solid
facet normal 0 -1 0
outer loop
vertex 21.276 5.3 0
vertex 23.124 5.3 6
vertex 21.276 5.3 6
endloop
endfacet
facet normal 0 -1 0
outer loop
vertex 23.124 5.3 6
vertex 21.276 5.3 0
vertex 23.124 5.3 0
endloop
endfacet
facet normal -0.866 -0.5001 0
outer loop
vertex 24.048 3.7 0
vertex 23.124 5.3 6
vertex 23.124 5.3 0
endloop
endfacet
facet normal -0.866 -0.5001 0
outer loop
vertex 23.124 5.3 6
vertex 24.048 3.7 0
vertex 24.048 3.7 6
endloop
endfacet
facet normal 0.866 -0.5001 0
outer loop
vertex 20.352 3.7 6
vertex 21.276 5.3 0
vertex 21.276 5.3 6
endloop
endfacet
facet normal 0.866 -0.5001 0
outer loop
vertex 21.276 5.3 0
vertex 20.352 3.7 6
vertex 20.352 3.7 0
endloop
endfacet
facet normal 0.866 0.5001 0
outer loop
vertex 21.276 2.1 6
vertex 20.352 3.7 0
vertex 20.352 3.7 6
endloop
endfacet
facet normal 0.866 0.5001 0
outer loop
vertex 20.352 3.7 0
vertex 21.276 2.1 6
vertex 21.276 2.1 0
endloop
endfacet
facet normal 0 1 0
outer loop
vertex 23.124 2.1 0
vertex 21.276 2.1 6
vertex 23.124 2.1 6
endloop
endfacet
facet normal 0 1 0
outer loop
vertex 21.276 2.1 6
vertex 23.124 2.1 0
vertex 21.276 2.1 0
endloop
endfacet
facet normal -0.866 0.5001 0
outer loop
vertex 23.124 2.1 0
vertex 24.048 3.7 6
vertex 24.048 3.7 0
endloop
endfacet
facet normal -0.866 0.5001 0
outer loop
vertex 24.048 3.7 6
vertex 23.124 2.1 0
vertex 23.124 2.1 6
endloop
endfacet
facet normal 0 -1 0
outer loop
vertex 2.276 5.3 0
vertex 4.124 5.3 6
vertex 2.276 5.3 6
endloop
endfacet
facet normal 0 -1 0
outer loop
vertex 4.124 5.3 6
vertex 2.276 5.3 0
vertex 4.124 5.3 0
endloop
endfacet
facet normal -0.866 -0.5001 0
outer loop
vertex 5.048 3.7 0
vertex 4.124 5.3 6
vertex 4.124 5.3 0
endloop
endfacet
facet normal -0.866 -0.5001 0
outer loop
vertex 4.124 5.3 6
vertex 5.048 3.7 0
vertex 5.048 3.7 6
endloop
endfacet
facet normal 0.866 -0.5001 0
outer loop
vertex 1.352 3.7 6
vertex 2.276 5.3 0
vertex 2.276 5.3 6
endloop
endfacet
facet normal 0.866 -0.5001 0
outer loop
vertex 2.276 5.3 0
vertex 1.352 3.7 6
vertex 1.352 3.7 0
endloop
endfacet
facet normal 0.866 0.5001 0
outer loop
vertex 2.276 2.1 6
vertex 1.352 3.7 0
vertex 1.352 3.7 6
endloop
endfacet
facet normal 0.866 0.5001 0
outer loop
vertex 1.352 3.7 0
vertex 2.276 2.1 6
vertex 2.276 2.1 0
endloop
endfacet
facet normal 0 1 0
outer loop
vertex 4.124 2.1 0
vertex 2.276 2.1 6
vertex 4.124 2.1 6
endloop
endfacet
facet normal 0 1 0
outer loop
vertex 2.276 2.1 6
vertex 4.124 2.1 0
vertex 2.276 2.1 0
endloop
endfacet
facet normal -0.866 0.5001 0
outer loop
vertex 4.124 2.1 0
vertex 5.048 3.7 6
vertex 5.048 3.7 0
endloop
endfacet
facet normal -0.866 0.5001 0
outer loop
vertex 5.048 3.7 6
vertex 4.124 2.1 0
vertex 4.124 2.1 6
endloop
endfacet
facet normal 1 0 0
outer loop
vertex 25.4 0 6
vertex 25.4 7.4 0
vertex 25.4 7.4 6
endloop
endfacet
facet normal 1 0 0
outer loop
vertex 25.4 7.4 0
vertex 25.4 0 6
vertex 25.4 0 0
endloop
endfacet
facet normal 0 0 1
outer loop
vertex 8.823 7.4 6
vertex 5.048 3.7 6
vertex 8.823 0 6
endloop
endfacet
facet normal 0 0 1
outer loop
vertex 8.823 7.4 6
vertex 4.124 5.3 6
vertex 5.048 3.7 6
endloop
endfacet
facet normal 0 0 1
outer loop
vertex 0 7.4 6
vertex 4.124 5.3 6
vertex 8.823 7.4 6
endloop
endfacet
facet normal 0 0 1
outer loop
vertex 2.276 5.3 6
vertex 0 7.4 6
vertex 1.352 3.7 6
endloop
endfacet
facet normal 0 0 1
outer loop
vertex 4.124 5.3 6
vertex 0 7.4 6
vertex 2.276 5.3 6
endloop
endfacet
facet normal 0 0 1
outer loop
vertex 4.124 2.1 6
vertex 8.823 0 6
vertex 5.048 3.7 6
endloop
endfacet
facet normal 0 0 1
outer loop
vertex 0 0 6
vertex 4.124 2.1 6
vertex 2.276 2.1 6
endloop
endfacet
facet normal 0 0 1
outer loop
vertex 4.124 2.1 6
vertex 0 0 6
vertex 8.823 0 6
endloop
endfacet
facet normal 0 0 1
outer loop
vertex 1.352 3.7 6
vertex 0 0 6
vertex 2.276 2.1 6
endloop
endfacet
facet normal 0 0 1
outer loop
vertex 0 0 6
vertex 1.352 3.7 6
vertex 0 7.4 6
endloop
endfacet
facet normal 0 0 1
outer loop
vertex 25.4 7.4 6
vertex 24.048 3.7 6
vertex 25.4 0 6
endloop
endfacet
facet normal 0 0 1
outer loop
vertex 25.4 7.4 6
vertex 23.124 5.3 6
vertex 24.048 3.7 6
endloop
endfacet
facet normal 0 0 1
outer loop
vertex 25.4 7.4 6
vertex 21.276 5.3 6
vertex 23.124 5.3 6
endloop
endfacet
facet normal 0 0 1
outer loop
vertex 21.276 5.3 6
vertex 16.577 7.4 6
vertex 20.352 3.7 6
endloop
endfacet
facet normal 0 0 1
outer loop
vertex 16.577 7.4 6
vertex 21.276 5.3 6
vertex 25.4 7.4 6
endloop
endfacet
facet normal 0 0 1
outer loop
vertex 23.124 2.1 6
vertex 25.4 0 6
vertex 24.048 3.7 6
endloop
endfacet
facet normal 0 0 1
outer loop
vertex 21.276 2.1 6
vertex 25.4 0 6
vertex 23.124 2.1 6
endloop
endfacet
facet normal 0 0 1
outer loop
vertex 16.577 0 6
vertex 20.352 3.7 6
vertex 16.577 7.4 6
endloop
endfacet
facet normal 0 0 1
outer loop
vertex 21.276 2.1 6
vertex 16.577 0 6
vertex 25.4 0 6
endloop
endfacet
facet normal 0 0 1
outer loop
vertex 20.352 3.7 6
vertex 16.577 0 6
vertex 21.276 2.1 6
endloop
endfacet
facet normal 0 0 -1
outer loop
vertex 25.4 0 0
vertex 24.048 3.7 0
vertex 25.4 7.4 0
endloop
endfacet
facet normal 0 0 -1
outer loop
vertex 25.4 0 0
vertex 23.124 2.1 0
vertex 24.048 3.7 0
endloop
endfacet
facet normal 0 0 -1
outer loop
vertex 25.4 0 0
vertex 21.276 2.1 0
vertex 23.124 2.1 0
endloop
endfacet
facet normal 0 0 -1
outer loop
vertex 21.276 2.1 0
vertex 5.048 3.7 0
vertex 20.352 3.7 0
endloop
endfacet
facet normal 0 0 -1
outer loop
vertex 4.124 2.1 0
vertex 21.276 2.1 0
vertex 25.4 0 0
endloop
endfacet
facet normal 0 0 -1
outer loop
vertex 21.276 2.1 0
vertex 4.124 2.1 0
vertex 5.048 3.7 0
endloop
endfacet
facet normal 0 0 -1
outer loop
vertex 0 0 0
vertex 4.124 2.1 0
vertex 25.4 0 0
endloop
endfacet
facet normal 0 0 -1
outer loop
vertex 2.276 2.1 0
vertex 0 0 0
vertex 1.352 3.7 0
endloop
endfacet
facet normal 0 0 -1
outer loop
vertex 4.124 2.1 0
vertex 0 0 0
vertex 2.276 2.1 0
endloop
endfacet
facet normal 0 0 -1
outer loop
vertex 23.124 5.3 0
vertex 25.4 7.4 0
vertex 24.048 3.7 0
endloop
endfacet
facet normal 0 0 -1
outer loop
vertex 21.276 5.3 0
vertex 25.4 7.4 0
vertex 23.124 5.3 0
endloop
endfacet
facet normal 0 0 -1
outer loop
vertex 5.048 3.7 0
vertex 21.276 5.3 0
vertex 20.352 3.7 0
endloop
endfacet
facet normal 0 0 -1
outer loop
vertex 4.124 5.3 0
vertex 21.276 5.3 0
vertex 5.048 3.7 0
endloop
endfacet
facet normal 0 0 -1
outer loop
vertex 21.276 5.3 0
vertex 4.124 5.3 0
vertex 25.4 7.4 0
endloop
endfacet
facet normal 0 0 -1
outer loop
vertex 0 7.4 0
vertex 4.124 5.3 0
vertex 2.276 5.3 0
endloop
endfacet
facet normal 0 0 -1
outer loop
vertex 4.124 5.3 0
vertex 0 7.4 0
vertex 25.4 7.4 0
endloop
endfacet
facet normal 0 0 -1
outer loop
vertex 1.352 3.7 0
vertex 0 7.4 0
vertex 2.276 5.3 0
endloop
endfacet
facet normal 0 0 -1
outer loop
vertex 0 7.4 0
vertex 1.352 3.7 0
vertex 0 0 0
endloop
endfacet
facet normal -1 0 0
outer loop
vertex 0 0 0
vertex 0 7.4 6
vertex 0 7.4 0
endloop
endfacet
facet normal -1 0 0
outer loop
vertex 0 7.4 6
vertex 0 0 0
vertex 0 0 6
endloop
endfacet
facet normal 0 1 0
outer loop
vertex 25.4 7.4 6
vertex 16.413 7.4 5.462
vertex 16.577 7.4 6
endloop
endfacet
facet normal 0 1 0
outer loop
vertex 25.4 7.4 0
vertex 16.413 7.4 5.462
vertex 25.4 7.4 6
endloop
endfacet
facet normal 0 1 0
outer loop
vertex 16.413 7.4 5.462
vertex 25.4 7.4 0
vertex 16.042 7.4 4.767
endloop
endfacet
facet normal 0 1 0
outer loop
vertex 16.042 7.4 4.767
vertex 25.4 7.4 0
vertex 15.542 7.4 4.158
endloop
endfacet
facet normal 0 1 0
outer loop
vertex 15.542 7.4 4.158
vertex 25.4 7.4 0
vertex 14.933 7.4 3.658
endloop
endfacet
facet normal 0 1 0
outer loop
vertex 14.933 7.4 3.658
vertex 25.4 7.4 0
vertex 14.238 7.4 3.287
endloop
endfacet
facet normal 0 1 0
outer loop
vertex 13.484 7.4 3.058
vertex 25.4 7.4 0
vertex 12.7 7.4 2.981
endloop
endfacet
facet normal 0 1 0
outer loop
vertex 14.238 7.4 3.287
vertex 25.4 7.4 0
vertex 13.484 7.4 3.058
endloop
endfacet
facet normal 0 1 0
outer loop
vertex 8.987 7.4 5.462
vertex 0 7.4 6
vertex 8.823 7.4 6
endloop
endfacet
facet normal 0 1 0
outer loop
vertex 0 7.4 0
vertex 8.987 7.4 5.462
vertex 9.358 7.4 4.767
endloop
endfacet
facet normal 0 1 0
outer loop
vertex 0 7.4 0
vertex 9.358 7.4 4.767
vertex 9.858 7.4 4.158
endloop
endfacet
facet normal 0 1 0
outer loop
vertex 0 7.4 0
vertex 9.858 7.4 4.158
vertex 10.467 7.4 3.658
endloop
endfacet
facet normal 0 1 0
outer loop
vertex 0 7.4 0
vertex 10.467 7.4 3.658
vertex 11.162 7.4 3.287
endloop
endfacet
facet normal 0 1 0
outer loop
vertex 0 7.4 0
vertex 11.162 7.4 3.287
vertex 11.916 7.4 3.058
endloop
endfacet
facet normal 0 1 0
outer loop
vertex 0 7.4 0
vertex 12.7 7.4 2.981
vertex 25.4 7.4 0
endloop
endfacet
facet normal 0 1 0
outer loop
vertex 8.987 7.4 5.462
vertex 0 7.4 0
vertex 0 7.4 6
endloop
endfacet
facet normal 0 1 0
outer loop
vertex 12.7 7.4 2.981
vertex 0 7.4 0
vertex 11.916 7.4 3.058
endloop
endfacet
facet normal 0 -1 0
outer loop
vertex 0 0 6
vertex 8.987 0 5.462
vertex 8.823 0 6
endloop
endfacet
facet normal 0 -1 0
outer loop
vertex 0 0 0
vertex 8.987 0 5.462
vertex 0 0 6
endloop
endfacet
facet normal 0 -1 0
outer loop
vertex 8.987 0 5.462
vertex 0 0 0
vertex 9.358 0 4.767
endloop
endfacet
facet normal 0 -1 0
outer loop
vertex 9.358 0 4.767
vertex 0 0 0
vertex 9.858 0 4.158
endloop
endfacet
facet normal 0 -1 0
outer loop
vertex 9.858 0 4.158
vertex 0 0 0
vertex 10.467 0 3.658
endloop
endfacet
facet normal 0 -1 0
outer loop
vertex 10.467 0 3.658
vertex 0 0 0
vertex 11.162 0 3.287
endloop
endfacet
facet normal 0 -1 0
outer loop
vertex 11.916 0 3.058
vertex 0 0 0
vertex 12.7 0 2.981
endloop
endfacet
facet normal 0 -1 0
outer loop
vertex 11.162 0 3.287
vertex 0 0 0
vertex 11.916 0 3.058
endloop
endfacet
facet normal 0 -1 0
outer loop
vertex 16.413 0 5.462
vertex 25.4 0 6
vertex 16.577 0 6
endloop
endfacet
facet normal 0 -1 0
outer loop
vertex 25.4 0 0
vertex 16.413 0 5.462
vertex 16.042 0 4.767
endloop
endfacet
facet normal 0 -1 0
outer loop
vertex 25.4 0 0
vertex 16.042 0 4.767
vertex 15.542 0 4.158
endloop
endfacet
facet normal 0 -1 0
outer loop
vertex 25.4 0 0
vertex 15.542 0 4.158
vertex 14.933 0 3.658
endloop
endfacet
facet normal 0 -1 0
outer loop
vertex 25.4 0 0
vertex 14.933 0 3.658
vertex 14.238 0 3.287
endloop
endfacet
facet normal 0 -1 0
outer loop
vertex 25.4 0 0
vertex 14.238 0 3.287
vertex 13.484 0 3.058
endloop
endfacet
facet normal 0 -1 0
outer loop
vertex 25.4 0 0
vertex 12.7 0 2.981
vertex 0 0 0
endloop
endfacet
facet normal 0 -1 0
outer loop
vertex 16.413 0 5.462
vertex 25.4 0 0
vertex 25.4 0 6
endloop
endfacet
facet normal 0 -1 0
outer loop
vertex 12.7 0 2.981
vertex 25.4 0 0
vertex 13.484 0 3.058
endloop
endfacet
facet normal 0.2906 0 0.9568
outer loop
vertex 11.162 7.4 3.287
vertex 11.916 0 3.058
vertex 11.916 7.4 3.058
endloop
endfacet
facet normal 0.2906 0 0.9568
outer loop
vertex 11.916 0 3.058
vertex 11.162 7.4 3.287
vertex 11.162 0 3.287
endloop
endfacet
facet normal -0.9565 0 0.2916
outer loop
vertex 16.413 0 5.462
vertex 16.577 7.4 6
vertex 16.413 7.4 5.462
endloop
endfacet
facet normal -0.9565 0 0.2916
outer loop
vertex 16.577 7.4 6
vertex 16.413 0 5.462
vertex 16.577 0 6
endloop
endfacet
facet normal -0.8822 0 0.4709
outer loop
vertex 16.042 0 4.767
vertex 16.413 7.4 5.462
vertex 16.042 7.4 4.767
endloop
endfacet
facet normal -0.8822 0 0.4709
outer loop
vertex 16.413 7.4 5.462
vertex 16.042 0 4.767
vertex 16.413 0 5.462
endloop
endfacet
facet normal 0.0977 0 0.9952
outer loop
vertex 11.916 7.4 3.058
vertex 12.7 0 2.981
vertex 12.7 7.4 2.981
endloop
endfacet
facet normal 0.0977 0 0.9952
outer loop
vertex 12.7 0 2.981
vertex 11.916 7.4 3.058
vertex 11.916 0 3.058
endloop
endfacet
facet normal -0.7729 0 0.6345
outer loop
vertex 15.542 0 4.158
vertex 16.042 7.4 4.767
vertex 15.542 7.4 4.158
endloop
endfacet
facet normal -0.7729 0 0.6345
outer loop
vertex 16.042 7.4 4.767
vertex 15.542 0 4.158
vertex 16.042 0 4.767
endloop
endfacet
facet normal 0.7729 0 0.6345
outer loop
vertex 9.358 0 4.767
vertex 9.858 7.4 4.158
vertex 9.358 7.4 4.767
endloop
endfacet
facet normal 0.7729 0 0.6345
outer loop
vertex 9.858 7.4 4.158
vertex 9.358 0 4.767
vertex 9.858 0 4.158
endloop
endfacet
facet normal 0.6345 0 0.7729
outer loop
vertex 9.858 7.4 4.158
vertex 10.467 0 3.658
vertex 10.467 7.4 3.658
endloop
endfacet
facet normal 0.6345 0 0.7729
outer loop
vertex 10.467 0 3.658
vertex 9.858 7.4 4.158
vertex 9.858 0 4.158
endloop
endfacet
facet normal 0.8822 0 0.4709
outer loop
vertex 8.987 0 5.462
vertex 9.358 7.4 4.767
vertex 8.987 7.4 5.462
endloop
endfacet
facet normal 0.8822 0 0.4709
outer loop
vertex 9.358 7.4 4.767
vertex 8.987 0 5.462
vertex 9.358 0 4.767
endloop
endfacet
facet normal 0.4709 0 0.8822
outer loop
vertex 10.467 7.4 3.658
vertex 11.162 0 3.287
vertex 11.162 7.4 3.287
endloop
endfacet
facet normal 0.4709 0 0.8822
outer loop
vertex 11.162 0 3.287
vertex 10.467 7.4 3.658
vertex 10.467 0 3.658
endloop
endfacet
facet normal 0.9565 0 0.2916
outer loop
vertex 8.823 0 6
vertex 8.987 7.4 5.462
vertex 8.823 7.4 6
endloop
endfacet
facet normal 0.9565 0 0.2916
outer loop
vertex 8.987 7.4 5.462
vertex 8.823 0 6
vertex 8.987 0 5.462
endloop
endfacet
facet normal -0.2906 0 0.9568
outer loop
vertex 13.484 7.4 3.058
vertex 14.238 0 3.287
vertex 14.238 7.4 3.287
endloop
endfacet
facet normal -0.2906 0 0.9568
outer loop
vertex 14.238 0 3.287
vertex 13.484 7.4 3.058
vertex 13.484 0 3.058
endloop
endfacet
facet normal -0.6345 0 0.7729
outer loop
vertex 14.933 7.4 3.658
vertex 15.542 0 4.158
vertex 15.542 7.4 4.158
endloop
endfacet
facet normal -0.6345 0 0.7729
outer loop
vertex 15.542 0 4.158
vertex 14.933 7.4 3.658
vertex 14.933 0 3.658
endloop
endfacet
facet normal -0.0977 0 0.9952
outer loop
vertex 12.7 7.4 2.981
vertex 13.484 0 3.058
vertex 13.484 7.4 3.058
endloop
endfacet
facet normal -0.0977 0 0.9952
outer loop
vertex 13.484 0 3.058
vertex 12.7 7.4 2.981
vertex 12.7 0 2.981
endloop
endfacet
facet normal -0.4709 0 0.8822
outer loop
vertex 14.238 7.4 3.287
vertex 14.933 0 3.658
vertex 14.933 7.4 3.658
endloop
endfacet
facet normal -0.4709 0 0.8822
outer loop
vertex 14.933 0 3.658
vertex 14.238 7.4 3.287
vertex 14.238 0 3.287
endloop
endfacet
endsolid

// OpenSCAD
// file: vars.scad
// Variables used throughout design.
// Yes, these could use some commenting.
// (c) 2014, Christopher "ScribbleJ" Jansen
huge=500;

printer_w = 400;
printer_l = 400;
printer_h = 400;

bearing_w = 7;
bearing_d = 22;
bearing_r = bearing_d/2;
bearing_hole_d = 8;
bearing_hole_r = bearing_hole_d/2;


misc_bolt_d = 3.2;
misc_bolt_r = misc_bolt_d/2;
misc_nut_r  = misc_bolt_d;
misc_bolt_pitch = 0.5;
misc_bolthead_d = misc_bolt_d*2;
misc_bolthead_r = misc_bolthead_d/2;

retainer_shell_thick = 0.5;
retainer_shell_sep   = 0.25;
//retainer_lip_thick   = 1;
retainer_lip_thick   = 2;
retainer_inner_width = 1;

belt_w    = 6;
belt_thick= 2;
belt_sep  = retainer_lip_thick*2 + 2;

calc_retainer_h  = retainer_lip_thick*2 + belt_w;
calc_retainer_ir = bearing_r + retainer_shell_thick*2 + retainer_shell_sep;
calc_retainer_or = calc_retainer_ir + belt_thick;
calc_retainer_b_off = retainer_lip_thick - (bearing_w-belt_w)/2;

tslot_w = 20;
tslot_bolt_d = 5;
tslot_bolt_r = tslot_bolt_d/2;
tslot_bolt_l = 4;
tslot_bolthead_d = 10;
tslot_bolthead_r = tslot_bolthead_d/2;


corner_thick = 5;
corner_length = tslot_w*3;

rod_d=8;
rod_r=rod_d/2;

bushing_d=15;
bushing_r=bushing_d/2;
bushing_l=10;
bushing_flange_r = bushing_r+3;
bushing_flange_w = 1;
bushing_material_thick = 5;

x_rod_sep = 50;
x_carriage_l = 50;
x_mount_sep_x = x_carriage_l - misc_bolthead_r*2*2 - misc_bolt_r*2;
x_mount_offset = bushing_r + misc_bolt_r * 2;
belt_above_x = bushing_r+misc_nut_r*2;
belt_clamp_w = 7;
x_rod_past_bearing = 20;

//belt_above_y = belt_above_x + x_rod_sep/2;
//y_above_x = belt_above_x-belt_above_y;
belt_above_y = 45;
y_above_x = belt_above_x-belt_above_y;




bearing_mount_base = corner_thick;
bearing_mount_extra = 2;
belt_above_bearing_mount = bearing_mount_base + bearing_mount_extra + retainer_lip_thick;
bearing_mount_support_tweak = 30;

y_bearing_offset = bushing_r+bushing_material_thick-calc_retainer_ir;

y_bearing_sep_y = calc_retainer_ir*2+belt_thick;
y_bearing_sep_z = belt_w+belt_sep;
bearing_bolt_r  = 4;
bearing_bolt_pitch = 1.25;
bearing_bolt_holder_thick = 4;
y_carriage_from_tslot = 2;

y_carriage_len = 50;

motor_w = 42.3;
motor_h = motor_w;
motor_bolt_sep = 31.0;
motor_bolt_r   = 1.5;
motor_pulley_d = 10;
motor_pulley_r = motor_pulley_d/2;
motor_pulley_h = 5.3;
motor_flange_d = 23;
motor_flange_r = motor_flange_d/2;
motor_corner_extra_hole_pos = tslot_bolt_r+3;

calc_corner_from_y_rod = x_rod_past_bearing+corner_thick+y_carriage_from_tslot+tslot_w;
calc_corner_above_x = belt_above_x - belt_above_bearing_mount + bearing_mount_base;

calc_motor1_above_x  = belt_above_x - motor_pulley_h;
calc_motor2_above_x  = belt_above_x - motor_pulley_h + belt_w + belt_sep;
calc_motor_from_y_rod = -bushing_r - bushing_material_thick + bearing_bolt_holder_thick + bearing_bolt_r + calc_retainer_or + motor_pulley_r;

motor_bracket_thick = 12;
motor_bracket_wide = (motor_w - motor_flange_d) / 2;
motor_bracket_len  = motor_w;
motor_bolt_offset  = (motor_w - motor_bolt_sep) / 2;

z_rod_sep = 150;
z_motor_off = motor_h - tslot_w - corner_thick;

laser_mat_thick = 4.75;
laser_mat_margin = laser_mat_thick;
bed_mount_sep   = 209;
bed_from_z      = 60;
bed_box_r       = 25;
bed_box_h       = 50;
z_ends_sep = printer_l - tslot_w*2 - corner_thick*2 - motor_w;
platform_l      =  laser_mat_margin*2 + laser_mat_thick*2 + bed_box_r*2 + z_ends_sep;
platform_w      = bed_mount_sep + misc_bolt_r*2 + laser_mat_margin*2;
z_leadscrew_passthrough_r = 12/2;
leadscrew_bolt_offset = 22/2;
leadscrew_bolt_r = 3.2/2;
laser_bushing_fudge = 0.1;


lm8uu_d=15;
lm8uu_r=lm8uu_d/2;
lm8uu_bolt_r=5/2;
lm8uu_nut_r=10/2;

arduino_width=60;
// file: common.scad
// Common functions used in various places throughout.
// (c) 2014, Christopher "ScribbleJ" Jansen
include <vars.scad>

// Reduce radius of holes intended to hold bolts by threads.
// 0.86603 * p = nominal depth of threads.  1/3-1/2 of that is about right.
function smallhole(r,p) = r - ((p*0.86603)/3);

// Polyhole derived from Nophead's Polyhole work: http://hydraraptor.blogspot.com/2011/02/polyholes.html
module polyhole(r,h,v=6,a=0)
{
  rotate([0,0,a]) cylinder( h = h, r = r  / cos( 180 / v ), $fn = v );
}
// 2D version of Polyhole
module polycircle(r,v=6,a=0)
{
  rotate([0,0,a]) circle(r = r  / cos( 180 / v ), $fn = v );
}
// Cutout for bolthole
module bolt(bolt_r = misc_bolt_r,bolthead_r = misc_bolthead_r,bolt_len = huge,v=6,a=0)
{
  translate([0,0,-bolt_len]) polyhole(r=bolt_r,h=bolt_len+1,v=v,a=a);
  polyhole(r=bolthead_r,h=huge,v=v,a=a);
}
// 2D ring
module ring(inner=5,outer=10,v=32)
{
  difference()
  {
    circle(r=outer);
    polycircle(r=inner,v=v);
  }
} 
// 2D Rounded square
module roundsquare(dim=[50,50],r=5)
{
  translate([0,r]) square([dim[0], dim[1] - r*2]);
  translate([r,0]) square([dim[0] - r*2, dim[1]]);
  for(x=[r,dim[0]-r])
  for(y=[r,dim[1]-r])
    translate([x,y]) circle(r=r);
}
// Lasercutting Tabs
module maketabs(l=100,w=5,num=10)
{
  tablength=l/(num * 2);
  for(x=[tablength/2:tablength*2:l])
    translate([x,0]) square([tablength,w]);
}
// Support for printing bearing mount
module support(l=bearing_mount_base+bearing_mount_extra+y_bearing_sep_z+calc_retainer_b_off,w=bearing_hole_d * tan(180/6) *2,extra=0,extra_l=0)
{
  translate([-w/2,0,-l]) 
  {
    difference()
    {
      rotate([45,0,0]) cube([w,huge/2,huge/2]);
      translate([-huge/2,0,0]) cube([huge,huge,huge]);
      translate([-huge/2,-huge/2,l]) cube([huge,huge,huge]);
    }
    translate([0,-extra,-extra_l/2]) cube([w,extra,extra_l]);
  }

}
// main file
// Mounting clamp for SainSmart Endstop on smooth rod.
// Print 6.
// (c) 2014, Christopher "ScribbleJ" Jansen
include <common.scad>

endstop();

bolt_sep = 19;

module endstop()
{
  difference()
  {
    cube([bolt_sep+misc_nut_r*2,misc_nut_r*2+1,rod_r-1+3]);
    translate([bolt_sep/2+misc_nut_r,-1,rod_r+3]) rotate([-90,0,0]) polyhole(r=rod_r,h=huge,v=32);
    for(x=[bolt_sep/2,-bolt_sep/2])
      translate([bolt_sep/2+misc_nut_r+x,misc_nut_r+0.5,-1]) polyhole(r=misc_bolt_r,h=huge);
  }
}
